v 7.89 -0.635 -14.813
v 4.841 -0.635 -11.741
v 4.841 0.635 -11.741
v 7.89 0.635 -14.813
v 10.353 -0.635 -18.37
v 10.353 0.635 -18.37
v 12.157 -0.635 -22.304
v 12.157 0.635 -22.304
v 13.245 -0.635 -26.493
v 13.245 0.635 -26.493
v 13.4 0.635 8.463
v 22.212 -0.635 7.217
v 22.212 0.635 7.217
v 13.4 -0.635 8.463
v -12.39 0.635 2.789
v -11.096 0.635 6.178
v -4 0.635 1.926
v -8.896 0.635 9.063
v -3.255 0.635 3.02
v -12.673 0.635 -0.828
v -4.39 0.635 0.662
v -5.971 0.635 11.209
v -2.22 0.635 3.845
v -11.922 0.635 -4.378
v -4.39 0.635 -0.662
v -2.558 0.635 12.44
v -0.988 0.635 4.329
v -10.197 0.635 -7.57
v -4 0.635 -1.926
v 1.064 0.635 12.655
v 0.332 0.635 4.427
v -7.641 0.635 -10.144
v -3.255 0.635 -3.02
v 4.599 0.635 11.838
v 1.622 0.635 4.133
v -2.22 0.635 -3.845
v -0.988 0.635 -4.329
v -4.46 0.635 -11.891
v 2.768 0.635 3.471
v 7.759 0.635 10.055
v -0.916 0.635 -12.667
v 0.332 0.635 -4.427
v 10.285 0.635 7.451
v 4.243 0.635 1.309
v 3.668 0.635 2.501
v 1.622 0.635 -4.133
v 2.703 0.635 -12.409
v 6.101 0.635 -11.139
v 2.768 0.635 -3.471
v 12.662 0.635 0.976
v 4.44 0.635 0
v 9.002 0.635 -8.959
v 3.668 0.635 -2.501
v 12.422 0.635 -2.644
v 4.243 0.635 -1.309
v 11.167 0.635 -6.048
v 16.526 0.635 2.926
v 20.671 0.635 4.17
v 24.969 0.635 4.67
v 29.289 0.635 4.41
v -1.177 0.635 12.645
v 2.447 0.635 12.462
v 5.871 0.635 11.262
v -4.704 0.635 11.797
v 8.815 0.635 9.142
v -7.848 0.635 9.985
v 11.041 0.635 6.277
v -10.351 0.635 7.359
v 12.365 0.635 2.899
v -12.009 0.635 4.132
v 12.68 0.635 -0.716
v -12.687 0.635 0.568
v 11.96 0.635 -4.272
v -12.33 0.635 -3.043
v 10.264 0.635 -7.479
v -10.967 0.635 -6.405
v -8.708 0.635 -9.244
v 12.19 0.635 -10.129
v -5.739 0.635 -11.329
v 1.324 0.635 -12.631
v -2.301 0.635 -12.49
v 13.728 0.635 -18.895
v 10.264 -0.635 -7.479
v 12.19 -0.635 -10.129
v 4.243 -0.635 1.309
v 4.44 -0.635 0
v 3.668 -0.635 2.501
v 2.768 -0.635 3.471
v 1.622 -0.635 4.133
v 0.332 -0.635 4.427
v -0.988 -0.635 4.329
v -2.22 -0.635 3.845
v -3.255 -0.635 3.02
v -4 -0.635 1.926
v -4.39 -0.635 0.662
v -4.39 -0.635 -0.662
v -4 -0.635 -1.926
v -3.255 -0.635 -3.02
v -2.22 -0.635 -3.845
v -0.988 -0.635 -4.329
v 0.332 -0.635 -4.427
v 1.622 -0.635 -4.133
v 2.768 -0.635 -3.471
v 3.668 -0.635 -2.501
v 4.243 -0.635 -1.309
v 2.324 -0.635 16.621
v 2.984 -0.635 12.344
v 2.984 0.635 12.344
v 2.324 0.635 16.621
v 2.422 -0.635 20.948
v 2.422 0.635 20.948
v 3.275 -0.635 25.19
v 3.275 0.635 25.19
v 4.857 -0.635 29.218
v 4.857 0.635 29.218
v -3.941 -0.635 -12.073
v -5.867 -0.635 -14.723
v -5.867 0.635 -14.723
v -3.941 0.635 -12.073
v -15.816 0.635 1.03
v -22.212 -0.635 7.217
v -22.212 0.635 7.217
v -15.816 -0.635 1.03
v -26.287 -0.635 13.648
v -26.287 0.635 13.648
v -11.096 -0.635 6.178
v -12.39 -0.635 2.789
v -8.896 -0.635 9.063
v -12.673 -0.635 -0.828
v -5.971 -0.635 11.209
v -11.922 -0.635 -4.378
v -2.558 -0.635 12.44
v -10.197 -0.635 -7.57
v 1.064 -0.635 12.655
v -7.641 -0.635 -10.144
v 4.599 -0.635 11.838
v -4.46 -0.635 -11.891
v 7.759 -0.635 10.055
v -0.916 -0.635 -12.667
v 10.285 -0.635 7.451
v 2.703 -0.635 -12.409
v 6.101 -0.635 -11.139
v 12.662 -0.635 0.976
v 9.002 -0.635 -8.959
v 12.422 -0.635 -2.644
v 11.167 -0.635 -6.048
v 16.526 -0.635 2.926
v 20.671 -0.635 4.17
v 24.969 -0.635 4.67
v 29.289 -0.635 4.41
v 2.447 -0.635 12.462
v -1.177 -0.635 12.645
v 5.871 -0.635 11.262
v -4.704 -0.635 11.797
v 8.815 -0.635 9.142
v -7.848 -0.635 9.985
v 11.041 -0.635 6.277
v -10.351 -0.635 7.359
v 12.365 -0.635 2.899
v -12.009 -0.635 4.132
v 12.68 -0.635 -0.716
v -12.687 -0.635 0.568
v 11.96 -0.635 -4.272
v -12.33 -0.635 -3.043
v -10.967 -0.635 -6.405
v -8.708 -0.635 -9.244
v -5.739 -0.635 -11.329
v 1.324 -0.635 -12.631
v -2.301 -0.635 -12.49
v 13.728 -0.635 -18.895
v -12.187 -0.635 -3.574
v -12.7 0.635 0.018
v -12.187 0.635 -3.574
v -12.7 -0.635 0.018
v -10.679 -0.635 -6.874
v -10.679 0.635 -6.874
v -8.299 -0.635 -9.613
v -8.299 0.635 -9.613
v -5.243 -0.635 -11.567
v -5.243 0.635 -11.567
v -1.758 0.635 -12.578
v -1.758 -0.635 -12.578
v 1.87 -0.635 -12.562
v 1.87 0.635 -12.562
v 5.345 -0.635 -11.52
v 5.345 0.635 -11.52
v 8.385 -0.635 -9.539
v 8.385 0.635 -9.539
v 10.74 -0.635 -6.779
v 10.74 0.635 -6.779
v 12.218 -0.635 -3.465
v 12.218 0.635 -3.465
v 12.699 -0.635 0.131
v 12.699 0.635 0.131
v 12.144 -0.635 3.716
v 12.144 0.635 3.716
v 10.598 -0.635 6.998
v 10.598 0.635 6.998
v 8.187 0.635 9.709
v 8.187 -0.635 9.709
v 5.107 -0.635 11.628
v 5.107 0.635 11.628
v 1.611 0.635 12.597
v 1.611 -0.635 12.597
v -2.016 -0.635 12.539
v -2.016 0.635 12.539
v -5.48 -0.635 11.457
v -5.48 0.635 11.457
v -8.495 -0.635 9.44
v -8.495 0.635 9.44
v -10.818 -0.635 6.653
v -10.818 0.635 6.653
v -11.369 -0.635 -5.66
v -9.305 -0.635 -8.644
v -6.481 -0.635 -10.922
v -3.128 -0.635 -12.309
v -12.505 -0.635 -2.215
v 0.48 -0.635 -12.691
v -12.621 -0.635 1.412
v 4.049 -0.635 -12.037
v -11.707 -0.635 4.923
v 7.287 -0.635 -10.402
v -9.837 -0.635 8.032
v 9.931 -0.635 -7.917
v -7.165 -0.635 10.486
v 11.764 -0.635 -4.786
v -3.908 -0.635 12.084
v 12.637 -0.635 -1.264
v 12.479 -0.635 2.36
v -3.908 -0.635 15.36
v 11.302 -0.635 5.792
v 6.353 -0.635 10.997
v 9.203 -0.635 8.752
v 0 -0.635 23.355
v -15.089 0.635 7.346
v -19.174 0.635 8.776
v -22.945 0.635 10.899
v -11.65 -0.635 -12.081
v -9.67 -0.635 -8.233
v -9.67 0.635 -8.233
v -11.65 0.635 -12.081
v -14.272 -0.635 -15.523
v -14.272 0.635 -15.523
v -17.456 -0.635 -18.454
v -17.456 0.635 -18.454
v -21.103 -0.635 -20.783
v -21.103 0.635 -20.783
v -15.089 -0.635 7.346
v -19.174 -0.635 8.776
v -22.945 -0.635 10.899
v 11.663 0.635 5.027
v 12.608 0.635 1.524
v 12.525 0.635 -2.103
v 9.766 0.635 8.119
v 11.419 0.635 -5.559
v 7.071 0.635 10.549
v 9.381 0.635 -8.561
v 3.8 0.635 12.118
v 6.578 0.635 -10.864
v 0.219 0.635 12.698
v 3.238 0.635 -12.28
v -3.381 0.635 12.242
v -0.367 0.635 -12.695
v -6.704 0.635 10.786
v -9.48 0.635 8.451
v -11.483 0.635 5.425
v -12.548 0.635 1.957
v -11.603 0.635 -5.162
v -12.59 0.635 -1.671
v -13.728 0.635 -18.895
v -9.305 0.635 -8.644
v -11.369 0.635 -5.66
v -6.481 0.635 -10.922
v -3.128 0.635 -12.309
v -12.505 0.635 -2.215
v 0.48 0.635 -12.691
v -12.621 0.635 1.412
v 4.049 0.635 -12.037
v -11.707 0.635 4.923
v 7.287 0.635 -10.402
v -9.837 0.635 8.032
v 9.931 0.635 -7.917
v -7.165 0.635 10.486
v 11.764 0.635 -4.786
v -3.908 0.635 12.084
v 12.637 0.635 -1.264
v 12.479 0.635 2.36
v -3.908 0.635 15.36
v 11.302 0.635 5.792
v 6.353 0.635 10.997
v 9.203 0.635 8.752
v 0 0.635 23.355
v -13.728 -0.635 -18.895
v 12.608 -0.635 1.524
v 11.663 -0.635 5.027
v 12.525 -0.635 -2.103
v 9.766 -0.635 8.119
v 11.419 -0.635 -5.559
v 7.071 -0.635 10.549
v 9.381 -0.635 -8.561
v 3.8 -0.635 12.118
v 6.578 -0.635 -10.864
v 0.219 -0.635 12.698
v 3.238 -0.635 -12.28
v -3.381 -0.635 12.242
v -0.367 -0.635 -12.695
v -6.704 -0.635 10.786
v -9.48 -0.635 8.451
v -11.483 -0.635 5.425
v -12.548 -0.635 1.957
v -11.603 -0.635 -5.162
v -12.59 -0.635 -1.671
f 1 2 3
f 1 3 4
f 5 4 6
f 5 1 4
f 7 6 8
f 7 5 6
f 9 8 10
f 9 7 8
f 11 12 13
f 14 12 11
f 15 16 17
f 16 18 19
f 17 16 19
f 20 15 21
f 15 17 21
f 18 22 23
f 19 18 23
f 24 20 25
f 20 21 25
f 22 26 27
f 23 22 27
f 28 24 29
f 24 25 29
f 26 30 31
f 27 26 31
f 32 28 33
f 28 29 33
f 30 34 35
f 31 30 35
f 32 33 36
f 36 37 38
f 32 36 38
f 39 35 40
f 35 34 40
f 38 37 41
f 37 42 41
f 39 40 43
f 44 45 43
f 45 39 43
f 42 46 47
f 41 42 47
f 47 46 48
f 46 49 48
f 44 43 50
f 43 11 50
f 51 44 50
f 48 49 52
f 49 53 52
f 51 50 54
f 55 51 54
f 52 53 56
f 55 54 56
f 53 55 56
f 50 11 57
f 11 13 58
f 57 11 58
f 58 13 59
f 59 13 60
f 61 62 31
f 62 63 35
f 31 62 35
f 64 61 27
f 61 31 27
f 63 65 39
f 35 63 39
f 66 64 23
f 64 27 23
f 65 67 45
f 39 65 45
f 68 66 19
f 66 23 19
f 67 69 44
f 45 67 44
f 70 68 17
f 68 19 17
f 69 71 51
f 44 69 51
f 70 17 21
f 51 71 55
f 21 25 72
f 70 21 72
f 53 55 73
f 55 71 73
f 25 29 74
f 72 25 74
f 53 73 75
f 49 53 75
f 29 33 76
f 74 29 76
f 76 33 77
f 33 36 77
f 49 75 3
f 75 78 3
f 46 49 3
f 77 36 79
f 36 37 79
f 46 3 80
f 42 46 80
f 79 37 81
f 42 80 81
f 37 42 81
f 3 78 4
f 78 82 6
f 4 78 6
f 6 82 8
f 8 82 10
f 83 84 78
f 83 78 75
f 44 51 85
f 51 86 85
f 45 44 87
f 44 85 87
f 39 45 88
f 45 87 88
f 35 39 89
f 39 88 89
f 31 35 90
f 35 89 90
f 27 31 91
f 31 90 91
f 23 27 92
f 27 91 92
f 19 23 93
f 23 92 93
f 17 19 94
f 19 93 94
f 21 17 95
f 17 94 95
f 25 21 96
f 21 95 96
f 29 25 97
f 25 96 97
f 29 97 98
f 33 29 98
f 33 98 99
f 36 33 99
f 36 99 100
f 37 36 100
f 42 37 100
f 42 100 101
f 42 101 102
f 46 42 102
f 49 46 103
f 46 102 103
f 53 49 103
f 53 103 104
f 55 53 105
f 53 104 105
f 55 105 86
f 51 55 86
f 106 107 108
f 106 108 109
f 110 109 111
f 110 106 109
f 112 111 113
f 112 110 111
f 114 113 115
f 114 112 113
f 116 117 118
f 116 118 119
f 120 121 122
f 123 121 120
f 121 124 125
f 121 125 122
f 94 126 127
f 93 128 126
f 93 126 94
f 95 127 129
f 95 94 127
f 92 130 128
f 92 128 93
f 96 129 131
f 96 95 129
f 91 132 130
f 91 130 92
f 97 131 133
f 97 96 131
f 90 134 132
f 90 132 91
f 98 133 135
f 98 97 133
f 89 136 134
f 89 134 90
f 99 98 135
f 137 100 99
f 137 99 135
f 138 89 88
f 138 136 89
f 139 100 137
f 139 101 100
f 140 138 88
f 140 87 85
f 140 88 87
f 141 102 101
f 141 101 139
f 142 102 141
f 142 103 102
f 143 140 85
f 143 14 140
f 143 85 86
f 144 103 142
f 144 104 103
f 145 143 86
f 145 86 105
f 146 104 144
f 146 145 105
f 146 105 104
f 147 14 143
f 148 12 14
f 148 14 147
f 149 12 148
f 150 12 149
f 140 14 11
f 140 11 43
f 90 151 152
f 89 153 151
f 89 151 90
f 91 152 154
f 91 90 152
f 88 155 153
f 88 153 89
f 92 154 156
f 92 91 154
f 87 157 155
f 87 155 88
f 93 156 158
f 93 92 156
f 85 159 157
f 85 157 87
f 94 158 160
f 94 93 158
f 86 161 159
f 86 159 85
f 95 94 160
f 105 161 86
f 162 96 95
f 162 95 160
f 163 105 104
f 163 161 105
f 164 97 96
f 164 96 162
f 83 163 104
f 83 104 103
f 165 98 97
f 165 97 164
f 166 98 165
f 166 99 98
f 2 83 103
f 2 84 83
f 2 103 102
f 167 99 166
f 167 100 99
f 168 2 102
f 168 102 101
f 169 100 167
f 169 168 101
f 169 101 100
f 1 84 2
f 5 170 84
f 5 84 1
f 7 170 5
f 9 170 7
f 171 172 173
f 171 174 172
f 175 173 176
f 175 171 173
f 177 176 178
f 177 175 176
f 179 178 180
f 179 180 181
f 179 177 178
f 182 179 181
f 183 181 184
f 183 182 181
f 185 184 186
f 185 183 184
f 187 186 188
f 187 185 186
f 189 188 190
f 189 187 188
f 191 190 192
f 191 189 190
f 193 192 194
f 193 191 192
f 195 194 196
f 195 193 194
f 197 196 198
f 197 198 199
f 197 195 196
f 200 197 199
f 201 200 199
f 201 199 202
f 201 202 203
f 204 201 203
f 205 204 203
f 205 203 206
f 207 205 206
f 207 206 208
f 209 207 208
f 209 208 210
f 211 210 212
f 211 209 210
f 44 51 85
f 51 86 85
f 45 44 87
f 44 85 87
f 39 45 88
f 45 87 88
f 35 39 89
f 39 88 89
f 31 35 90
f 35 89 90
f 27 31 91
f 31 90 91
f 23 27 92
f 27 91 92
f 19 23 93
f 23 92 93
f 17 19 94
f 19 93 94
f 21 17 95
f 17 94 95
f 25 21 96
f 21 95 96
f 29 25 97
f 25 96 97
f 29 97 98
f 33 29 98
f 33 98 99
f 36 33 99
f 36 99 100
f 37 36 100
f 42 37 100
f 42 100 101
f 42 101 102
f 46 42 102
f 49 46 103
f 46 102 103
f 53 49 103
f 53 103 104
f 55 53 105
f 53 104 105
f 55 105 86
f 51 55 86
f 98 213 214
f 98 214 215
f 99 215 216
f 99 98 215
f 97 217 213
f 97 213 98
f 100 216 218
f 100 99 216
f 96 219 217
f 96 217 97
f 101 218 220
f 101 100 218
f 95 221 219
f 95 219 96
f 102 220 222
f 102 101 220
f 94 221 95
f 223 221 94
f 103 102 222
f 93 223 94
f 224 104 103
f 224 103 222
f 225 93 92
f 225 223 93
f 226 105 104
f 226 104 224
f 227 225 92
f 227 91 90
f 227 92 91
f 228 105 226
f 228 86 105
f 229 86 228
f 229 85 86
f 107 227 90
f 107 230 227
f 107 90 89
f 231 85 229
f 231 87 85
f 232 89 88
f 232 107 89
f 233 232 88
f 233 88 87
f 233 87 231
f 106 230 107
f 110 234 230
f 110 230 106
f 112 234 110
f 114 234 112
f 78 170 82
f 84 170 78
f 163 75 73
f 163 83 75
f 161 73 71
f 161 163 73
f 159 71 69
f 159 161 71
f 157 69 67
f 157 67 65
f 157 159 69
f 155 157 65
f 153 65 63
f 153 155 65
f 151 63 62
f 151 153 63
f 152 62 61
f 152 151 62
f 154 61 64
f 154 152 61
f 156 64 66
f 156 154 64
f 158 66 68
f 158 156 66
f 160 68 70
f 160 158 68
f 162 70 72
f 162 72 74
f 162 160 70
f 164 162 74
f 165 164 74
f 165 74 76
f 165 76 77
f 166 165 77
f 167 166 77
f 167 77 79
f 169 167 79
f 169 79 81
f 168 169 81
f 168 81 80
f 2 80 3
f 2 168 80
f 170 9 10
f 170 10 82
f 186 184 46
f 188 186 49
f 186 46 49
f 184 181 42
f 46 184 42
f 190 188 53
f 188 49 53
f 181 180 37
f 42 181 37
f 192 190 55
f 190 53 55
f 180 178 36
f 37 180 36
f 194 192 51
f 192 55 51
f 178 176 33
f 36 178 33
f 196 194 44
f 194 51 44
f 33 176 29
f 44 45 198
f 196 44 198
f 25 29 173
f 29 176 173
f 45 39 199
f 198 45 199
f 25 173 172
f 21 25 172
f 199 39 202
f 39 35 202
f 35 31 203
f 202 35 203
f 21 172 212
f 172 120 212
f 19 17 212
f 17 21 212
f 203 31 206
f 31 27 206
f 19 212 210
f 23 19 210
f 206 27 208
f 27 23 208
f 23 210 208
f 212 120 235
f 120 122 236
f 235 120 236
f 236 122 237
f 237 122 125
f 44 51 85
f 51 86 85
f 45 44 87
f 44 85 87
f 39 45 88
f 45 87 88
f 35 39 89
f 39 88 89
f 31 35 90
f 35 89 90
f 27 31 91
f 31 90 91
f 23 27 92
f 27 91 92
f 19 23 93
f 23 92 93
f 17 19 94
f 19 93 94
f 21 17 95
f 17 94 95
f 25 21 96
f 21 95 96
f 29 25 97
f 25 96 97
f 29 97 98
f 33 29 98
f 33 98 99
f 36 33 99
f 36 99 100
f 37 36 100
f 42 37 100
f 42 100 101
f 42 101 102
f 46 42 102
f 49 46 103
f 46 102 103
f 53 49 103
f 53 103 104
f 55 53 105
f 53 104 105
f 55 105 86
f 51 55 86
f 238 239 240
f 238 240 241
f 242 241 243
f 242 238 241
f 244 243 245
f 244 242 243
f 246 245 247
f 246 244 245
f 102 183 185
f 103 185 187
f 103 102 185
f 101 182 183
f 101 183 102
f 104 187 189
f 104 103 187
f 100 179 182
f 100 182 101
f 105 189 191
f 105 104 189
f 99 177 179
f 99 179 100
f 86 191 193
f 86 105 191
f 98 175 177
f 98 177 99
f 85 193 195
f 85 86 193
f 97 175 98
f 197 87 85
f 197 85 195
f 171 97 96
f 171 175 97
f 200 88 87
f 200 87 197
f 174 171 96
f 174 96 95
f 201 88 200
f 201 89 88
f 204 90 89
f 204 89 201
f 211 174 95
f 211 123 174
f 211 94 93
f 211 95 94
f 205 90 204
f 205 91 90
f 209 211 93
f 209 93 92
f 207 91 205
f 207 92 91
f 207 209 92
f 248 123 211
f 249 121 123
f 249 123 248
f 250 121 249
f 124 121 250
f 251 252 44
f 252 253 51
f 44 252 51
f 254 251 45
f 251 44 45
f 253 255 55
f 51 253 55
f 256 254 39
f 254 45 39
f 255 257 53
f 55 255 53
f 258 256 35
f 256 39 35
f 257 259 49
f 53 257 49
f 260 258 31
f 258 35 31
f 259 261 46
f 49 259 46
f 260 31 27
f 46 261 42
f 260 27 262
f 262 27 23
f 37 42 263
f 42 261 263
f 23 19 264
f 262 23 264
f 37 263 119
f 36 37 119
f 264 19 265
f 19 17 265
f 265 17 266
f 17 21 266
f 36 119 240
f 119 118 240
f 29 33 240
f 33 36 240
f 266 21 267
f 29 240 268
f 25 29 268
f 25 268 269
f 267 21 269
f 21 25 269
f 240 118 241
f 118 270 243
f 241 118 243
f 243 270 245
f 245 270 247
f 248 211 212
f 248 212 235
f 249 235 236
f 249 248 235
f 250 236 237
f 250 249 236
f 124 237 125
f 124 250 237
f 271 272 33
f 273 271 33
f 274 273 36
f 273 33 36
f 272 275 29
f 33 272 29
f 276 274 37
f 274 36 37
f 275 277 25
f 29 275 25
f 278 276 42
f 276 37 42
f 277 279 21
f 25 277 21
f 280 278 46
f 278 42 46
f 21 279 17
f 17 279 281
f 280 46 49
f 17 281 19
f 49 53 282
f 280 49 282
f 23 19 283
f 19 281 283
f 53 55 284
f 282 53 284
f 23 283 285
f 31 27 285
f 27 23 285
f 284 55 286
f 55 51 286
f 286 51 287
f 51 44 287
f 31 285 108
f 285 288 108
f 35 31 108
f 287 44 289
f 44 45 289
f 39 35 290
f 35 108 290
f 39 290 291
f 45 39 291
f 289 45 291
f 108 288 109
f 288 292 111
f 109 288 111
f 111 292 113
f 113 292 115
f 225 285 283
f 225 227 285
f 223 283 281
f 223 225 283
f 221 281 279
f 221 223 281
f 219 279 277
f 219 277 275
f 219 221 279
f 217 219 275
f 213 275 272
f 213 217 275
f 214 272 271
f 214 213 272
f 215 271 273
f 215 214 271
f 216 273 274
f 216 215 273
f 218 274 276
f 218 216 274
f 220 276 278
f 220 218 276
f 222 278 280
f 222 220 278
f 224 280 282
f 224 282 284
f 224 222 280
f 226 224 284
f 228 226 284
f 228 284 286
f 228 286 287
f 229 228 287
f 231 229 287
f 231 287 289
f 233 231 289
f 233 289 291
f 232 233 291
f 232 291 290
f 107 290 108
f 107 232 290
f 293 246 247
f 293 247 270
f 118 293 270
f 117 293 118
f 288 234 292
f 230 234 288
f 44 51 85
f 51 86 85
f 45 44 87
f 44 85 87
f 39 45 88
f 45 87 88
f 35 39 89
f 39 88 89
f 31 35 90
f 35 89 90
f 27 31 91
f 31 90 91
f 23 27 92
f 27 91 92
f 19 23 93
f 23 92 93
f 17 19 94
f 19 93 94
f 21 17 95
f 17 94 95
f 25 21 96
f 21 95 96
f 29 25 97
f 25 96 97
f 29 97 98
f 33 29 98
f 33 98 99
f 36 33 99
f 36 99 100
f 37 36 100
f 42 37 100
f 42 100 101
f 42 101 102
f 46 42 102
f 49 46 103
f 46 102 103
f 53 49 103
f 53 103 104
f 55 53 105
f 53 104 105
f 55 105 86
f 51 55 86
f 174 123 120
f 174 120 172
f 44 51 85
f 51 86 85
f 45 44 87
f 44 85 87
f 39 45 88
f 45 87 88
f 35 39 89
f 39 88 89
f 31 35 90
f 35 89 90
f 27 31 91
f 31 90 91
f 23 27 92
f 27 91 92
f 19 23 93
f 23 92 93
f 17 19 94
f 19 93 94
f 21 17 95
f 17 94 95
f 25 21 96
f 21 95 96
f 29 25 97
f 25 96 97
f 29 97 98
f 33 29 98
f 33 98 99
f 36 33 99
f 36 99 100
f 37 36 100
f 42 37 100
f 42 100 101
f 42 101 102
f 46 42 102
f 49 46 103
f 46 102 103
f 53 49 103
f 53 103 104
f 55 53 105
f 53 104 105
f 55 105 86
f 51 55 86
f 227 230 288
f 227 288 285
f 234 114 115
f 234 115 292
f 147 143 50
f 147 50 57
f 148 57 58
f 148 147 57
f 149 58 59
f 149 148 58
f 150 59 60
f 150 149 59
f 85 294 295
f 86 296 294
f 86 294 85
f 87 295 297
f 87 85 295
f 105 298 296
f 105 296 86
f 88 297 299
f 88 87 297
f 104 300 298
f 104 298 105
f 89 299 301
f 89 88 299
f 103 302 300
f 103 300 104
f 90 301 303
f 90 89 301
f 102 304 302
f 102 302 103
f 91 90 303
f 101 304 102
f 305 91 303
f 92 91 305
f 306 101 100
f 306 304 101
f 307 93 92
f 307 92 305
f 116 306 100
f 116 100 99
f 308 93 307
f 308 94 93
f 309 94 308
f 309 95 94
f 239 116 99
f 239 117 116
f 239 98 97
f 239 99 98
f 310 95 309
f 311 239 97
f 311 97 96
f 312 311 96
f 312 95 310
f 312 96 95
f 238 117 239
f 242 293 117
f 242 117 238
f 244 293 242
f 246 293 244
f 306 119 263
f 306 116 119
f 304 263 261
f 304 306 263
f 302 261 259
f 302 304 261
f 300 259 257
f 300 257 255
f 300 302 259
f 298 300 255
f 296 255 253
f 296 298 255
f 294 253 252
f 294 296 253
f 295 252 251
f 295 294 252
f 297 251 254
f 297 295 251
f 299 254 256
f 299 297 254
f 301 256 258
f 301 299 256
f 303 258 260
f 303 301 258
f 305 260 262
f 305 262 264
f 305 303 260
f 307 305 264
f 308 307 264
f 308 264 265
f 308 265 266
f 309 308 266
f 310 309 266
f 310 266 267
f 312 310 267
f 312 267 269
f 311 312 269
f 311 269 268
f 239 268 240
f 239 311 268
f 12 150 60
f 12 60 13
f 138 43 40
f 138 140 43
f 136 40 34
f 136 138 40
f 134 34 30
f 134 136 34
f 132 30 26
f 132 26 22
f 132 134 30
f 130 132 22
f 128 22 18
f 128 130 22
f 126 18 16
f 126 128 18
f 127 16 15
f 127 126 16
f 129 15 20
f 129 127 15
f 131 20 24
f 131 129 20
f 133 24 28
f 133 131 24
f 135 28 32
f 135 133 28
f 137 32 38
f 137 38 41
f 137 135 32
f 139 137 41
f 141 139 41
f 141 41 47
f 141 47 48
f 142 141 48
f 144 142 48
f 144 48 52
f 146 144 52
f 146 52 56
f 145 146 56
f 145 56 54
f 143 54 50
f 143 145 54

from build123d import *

# Parameters (mm, degrees)
F0_R     = 12.7
F1_DEPTH = 0.635
F3_DEPTH = 0.635
F4_COUNT = 5
F5_R     = 4.439905
F6_DEPTH = 0.635


with BuildPart() as f1:
    # F0 (on Front) → F1 (new body, symmetric)
    with BuildSketch(Plane.XZ):
        Circle(F0_R)
    extrude(amount=F1_DEPTH, both=True)

    # F2 (on Front) → F3 (join, symmetric)
    with BuildSketch(Plane.XZ):
        with BuildLine():
            Line((-3.907746, 9.398649), (3.907746, 9.398649))
            ThreePointArc((3.907746, 9.398649), (2.29972, 19.408061), (4.856857, 29.218012))
            Line((4.856857, 29.218012), (0, 23.355249))
            Line((0, 23.355249), (-3.907746, 15.359705))
            Line((-3.907746, 15.359705), (-3.907746, 9.398649))
        make_face()
    extrude(amount=F3_DEPTH, both=True)


with BuildPart() as f4_1:
    # F4: instance of F1
    add(f1.part.rotate(Axis((0, -0.635, 0), (0, 1, 0)), 1 * 360 / F4_COUNT))


with BuildPart() as f4_2:
    # F4: instance of F1
    add(f1.part.rotate(Axis((0, -0.635, 0), (0, 1, 0)), 2 * 360 / F4_COUNT))


with BuildPart() as f4_3:
    # F4: instance of F1
    add(f1.part.rotate(Axis((0, -0.635, 0), (0, 1, 0)), 3 * 360 / F4_COUNT))


with BuildPart() as f4_4:
    # F4: instance of F1
    add(f1.part.rotate(Axis((0, -0.635, 0), (0, 1, 0)), 4 * 360 / F4_COUNT))


with BuildPart() as f6_tool:
    # F5 (on Front) → F6 (new body, symmetric)
    with BuildSketch(Plane.XZ):
        Circle(F5_R)
    extrude(amount=F6_DEPTH, both=True)


with BuildPart() as f1_1:
    add(f1.part)

    # F6: cut by f6_tool
    add(f6_tool.part, mode=Mode.SUBTRACT)


with BuildPart() as f4_1_1:
    add(f4_1.part)

    # F6: cut by f6_tool
    add(f6_tool.part, mode=Mode.SUBTRACT)


with BuildPart() as f4_2_1:
    add(f4_2.part)

    # F6: cut by f6_tool
    add(f6_tool.part, mode=Mode.SUBTRACT)


with BuildPart() as f4_3_1:
    add(f4_3.part)

    # F6: cut by f6_tool
    add(f6_tool.part, mode=Mode.SUBTRACT)


with BuildPart() as f4_4_1:
    add(f4_4.part)

    # F6: cut by f6_tool
    add(f6_tool.part, mode=Mode.SUBTRACT)


solid = Compound([f1_1.part, f4_1_1.part, f4_2_1.part, f4_3_1.part, f4_4_1.part])
